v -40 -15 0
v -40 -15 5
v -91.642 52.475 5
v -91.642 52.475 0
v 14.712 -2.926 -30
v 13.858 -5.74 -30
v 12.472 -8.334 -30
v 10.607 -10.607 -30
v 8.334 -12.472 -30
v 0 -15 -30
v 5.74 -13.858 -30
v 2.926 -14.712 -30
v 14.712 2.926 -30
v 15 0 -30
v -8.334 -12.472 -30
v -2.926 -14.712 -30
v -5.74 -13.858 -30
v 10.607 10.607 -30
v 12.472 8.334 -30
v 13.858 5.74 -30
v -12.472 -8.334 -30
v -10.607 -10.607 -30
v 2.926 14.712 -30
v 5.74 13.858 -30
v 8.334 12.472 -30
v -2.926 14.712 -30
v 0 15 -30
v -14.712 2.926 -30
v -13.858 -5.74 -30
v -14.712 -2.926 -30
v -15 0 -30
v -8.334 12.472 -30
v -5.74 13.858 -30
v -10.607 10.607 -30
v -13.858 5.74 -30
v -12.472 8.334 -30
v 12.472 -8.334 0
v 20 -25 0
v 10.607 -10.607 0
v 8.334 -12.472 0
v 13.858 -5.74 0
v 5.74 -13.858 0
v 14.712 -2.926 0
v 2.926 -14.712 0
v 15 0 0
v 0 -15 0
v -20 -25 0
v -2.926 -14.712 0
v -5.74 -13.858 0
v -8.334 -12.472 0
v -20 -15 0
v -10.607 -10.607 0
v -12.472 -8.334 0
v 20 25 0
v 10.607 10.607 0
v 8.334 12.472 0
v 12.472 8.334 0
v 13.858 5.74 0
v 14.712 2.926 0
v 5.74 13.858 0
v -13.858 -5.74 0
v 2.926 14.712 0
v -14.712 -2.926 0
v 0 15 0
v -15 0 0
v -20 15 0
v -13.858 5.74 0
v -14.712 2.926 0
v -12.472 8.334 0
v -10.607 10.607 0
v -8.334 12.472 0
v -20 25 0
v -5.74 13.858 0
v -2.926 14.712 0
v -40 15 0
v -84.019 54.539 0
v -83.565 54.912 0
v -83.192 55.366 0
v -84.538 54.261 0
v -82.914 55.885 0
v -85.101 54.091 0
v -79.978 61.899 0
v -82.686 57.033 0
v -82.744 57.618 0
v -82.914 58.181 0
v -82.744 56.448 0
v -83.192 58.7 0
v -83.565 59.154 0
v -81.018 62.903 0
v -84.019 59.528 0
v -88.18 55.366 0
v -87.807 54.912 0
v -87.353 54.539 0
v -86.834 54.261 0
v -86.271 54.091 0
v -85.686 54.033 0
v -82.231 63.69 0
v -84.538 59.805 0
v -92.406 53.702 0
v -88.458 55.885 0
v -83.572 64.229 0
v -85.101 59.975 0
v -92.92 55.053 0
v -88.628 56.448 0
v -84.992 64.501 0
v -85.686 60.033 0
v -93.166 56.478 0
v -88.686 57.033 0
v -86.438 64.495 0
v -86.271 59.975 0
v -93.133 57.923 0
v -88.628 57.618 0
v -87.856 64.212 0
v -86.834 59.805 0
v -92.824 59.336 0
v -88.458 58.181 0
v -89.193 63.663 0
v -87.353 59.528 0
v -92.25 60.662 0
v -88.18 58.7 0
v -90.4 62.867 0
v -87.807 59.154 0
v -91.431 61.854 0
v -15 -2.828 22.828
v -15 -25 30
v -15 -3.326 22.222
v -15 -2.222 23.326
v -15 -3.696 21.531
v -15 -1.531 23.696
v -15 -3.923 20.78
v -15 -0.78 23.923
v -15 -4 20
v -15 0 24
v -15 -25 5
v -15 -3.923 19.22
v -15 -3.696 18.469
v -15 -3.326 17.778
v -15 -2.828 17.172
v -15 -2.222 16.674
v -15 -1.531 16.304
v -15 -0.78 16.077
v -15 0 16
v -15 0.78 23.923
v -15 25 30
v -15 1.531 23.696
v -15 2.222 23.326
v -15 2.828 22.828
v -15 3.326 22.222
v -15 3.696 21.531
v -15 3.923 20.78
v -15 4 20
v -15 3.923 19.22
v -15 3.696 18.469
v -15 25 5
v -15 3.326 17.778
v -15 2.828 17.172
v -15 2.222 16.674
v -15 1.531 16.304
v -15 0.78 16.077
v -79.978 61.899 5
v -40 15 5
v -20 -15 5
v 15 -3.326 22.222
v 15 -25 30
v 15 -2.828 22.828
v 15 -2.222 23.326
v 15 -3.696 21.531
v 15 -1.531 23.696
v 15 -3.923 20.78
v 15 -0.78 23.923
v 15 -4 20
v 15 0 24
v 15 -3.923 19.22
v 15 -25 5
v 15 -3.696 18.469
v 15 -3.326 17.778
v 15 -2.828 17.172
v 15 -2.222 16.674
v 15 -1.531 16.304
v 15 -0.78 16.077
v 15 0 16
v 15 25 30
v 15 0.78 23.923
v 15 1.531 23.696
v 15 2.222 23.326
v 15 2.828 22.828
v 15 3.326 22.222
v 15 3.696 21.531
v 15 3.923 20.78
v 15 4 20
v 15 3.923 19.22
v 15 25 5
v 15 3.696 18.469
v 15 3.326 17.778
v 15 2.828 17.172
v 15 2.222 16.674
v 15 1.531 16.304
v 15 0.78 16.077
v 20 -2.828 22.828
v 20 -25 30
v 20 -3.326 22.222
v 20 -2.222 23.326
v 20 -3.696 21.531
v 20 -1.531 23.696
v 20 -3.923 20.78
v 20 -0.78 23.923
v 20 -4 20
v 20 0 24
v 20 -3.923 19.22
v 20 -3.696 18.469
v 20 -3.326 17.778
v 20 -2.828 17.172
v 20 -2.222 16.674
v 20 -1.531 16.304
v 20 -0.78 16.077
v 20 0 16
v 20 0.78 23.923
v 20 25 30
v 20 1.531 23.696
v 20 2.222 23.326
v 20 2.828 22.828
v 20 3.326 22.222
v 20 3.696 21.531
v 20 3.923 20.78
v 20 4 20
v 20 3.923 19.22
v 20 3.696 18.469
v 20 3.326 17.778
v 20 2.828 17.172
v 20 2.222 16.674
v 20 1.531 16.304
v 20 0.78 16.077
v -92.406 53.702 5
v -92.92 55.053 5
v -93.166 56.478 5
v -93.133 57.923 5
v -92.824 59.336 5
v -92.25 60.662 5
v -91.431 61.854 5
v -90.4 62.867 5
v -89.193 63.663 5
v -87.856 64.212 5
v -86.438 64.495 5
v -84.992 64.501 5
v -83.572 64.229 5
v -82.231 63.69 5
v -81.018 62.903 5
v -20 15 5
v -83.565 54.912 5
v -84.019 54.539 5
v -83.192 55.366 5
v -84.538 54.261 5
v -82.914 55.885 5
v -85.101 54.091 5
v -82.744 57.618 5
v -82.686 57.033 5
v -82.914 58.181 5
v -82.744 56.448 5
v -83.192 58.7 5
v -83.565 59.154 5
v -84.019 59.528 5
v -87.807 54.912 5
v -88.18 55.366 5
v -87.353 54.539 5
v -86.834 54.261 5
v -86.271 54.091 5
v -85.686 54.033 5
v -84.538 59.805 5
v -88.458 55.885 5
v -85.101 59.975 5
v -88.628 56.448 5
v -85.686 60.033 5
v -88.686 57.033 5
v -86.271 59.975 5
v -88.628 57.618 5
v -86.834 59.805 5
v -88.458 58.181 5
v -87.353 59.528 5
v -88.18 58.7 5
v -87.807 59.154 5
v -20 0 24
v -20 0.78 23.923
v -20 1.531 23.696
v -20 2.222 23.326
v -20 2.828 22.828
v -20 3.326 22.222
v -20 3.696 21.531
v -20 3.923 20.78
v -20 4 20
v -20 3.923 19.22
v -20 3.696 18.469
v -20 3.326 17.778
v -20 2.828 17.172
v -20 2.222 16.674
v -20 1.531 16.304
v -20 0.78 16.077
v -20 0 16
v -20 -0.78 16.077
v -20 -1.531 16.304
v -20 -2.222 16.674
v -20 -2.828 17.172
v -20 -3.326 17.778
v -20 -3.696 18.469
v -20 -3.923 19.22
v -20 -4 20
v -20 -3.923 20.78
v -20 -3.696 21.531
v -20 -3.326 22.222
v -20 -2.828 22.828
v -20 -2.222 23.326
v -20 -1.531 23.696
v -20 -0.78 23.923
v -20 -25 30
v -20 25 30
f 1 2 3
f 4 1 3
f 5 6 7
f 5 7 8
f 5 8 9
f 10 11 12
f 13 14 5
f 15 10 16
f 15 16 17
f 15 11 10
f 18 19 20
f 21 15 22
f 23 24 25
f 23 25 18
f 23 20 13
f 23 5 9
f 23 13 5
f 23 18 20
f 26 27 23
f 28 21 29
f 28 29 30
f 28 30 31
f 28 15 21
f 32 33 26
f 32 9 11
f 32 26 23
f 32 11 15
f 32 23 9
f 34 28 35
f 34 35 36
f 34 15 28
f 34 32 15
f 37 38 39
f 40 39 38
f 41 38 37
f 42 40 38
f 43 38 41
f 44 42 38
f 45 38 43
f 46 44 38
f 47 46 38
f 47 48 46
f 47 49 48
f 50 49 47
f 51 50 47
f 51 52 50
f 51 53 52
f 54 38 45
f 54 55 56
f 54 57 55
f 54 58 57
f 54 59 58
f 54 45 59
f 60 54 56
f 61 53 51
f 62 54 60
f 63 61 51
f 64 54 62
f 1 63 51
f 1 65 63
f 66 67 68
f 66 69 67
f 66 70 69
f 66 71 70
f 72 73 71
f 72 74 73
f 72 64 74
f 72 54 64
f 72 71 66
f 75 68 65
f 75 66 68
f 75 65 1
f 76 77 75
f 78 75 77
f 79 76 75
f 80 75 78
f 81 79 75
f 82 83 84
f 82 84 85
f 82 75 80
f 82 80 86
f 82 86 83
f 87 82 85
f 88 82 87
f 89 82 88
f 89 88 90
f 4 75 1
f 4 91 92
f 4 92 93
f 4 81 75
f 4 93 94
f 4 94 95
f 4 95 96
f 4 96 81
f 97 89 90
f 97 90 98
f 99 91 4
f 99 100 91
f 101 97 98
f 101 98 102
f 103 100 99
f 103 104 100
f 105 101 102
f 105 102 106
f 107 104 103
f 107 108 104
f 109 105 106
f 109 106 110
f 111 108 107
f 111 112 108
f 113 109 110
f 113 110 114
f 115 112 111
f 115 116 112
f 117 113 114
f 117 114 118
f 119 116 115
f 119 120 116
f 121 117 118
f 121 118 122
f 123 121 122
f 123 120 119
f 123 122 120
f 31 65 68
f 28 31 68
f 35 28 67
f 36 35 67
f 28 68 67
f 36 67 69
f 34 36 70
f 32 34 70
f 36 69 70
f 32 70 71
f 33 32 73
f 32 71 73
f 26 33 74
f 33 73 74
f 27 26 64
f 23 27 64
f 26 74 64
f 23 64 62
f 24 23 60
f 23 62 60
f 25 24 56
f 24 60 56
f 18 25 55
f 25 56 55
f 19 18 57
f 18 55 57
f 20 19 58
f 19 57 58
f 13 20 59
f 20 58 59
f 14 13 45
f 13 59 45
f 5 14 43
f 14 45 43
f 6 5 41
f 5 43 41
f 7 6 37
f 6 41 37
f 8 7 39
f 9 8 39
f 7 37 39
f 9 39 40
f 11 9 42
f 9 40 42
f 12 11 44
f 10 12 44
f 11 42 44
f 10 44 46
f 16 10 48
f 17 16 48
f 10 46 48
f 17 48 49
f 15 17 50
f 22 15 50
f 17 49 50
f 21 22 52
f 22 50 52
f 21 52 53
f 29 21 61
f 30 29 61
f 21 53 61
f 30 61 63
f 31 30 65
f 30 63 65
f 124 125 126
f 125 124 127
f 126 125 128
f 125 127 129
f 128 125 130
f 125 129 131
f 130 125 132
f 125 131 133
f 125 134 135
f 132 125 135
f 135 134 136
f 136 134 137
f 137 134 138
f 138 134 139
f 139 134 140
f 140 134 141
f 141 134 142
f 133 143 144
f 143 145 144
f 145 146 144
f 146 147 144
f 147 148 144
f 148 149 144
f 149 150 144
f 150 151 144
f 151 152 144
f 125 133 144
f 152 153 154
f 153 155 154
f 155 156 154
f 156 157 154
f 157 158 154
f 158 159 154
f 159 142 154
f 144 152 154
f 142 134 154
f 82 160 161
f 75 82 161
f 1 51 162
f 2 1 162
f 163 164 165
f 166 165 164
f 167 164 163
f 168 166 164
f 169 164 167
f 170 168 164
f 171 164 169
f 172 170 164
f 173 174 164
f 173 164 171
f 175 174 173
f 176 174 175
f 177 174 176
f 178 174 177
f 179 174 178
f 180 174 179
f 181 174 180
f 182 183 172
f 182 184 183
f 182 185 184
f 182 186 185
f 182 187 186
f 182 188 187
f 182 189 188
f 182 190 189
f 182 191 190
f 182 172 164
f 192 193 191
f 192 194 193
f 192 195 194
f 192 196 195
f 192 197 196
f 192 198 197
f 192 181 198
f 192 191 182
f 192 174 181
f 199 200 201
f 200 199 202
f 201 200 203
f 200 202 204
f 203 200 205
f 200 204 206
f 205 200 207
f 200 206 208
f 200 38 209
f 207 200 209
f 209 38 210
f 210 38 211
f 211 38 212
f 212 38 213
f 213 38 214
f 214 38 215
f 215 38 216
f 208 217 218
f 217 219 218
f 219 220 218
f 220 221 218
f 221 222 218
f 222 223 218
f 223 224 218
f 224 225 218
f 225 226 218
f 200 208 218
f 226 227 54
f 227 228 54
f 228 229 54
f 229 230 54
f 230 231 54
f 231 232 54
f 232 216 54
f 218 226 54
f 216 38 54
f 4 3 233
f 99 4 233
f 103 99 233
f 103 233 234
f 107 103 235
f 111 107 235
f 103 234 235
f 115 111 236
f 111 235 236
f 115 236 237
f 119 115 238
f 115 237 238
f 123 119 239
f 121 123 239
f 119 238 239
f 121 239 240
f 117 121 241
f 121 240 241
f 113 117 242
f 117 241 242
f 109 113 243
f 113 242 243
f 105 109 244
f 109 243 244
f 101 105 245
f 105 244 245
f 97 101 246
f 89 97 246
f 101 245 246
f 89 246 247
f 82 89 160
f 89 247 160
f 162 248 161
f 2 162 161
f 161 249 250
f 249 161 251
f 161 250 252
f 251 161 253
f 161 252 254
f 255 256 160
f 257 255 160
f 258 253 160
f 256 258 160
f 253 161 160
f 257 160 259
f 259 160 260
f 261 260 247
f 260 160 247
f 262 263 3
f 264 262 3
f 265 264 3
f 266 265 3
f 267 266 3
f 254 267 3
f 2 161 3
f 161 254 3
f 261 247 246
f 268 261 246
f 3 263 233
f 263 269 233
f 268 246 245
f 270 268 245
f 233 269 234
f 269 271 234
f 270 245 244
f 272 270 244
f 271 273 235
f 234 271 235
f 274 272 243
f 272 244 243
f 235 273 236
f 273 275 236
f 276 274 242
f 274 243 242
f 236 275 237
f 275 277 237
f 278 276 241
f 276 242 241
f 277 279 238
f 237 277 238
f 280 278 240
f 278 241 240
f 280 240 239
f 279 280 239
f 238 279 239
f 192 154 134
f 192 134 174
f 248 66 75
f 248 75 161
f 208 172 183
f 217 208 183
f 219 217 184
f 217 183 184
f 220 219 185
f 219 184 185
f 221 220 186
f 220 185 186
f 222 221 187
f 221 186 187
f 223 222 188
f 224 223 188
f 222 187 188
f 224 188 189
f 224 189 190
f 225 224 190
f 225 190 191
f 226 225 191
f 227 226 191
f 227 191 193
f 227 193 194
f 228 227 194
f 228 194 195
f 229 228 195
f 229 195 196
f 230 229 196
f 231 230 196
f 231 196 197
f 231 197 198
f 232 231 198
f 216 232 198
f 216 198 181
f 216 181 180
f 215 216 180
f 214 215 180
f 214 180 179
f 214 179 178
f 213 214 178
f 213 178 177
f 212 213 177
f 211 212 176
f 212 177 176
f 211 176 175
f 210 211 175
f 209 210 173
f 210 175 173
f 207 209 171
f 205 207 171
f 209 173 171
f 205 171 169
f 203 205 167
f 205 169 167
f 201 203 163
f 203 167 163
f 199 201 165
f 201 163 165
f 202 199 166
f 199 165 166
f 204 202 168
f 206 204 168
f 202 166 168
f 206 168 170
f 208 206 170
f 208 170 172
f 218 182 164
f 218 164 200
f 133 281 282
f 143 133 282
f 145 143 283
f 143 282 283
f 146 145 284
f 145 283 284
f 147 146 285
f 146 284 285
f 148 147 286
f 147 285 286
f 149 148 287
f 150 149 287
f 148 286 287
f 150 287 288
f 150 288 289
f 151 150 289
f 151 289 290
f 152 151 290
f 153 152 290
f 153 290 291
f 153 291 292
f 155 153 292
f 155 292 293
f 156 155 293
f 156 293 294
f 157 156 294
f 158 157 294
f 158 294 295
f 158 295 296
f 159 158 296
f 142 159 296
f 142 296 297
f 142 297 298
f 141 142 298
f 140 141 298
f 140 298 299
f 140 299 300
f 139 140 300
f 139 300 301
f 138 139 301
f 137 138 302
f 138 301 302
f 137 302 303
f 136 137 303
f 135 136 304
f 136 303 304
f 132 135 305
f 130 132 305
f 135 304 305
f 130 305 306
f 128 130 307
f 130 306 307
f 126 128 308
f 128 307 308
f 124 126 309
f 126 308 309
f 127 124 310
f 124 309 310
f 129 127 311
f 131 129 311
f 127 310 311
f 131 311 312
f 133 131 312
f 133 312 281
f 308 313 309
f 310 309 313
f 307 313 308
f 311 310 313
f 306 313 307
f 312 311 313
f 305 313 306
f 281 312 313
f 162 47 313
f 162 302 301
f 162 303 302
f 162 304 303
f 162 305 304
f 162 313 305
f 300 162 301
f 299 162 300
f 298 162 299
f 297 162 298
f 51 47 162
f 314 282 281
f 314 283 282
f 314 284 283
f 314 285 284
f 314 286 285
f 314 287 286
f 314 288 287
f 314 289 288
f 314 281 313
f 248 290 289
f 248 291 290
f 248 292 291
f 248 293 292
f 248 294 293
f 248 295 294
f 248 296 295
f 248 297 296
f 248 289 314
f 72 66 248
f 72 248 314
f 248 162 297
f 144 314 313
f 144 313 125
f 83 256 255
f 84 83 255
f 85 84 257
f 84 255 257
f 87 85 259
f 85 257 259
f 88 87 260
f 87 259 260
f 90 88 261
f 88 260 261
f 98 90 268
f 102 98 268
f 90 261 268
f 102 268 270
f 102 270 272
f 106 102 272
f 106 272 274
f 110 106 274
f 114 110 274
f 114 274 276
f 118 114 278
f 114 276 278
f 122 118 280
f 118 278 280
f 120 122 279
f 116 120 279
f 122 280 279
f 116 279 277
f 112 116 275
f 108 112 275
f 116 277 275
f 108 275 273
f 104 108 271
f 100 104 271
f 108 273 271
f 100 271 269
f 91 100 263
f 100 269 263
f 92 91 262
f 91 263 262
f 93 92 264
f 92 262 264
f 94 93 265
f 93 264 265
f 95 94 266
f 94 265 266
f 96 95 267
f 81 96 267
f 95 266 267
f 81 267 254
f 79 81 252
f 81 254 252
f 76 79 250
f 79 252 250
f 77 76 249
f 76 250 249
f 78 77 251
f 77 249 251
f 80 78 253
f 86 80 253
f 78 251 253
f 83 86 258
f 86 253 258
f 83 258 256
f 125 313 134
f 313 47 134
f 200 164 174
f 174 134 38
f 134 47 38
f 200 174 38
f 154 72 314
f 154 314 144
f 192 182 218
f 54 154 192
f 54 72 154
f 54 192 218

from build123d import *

# Parameters (mm, degrees)
SKETCH1_W           = 40
SKETCH1_H           = 50
BOSS_EXTRUDE1_DEPTH = 5
SKETCH2_W           = 5
SKETCH2_H           = 50
BOSS_EXTRUDE2_DEPTH = 25
SKETCH3_R           = 4
CUT_EXTRUDE1_DEPTH  = 56.901699437
SKETCH4_W           = 5
SKETCH4_H           = 30
BOSS_EXTRUDE3_DEPTH = 20
SKETCH5_R           = 3
BOSS_EXTRUDE4_DEPTH = 5
SKETCH6_R           = 15
BOSS_EXTRUDE5_DEPTH = 30


with BuildPart() as part:
    # Sketch1 → Boss-Extrude1 (new body)
    with BuildSketch(Plane.XY):
        Rectangle(SKETCH1_W, SKETCH1_H)
    extrude(amount=BOSS_EXTRUDE1_DEPTH)

    # Sketch2 → Boss-Extrude2 (add)
    with BuildSketch(Plane.XY.offset(5)):
        with Locations((-17.5, 0)):
            Rectangle(SKETCH2_W, SKETCH2_H)
        with Locations((17.5, 0)):
            Rectangle(SKETCH2_W, SKETCH2_H)
    extrude(amount=BOSS_EXTRUDE2_DEPTH)

    # Sketch3 → Cut-Extrude1 (cut, through all)
    with BuildSketch(Plane.ZY.offset(20)):
        with Locations((20, 0)):
            Circle(SKETCH3_R)
    extrude(amount=-CUT_EXTRUDE1_DEPTH, mode=Mode.SUBTRACT)

    # Sketch4 → Boss-Extrude3 (add)
    with BuildSketch(Plane.ZY.offset(20)):
        with Locations((2.5, 0)):
            Rectangle(SKETCH4_W, SKETCH4_H)
    extrude(amount=BOSS_EXTRUDE3_DEPTH)

    # Sketch5 → Boss-Extrude4 (add)
    with BuildSketch(Plane.XY.offset(5)):
        with BuildLine():
            Line((-40, 15), (-40, -15))
            Line((-40, -15), (-91.641900121, 52.474794317))
            ThreePointArc((-91.641900121, 52.474794317), (-90.399583659, 62.866857636), (-79.978416938, 61.898552722))
            Line((-79.978416938, 61.898552722), (-40, 15))
        make_face()
        with Locations((-85.686070809, 57.033094132)):
            Circle(SKETCH5_R, mode=Mode.SUBTRACT)
    extrude(amount=-BOSS_EXTRUDE4_DEPTH)

    # Sketch6 → Boss-Extrude5 (add)
    with BuildSketch(Plane(origin=(0, 0, 0), x_dir=(-1, 0, 0), z_dir=(0, 0, -1))):
        Circle(SKETCH6_R)
    extrude(amount=BOSS_EXTRUDE5_DEPTH)


solid = part.part
